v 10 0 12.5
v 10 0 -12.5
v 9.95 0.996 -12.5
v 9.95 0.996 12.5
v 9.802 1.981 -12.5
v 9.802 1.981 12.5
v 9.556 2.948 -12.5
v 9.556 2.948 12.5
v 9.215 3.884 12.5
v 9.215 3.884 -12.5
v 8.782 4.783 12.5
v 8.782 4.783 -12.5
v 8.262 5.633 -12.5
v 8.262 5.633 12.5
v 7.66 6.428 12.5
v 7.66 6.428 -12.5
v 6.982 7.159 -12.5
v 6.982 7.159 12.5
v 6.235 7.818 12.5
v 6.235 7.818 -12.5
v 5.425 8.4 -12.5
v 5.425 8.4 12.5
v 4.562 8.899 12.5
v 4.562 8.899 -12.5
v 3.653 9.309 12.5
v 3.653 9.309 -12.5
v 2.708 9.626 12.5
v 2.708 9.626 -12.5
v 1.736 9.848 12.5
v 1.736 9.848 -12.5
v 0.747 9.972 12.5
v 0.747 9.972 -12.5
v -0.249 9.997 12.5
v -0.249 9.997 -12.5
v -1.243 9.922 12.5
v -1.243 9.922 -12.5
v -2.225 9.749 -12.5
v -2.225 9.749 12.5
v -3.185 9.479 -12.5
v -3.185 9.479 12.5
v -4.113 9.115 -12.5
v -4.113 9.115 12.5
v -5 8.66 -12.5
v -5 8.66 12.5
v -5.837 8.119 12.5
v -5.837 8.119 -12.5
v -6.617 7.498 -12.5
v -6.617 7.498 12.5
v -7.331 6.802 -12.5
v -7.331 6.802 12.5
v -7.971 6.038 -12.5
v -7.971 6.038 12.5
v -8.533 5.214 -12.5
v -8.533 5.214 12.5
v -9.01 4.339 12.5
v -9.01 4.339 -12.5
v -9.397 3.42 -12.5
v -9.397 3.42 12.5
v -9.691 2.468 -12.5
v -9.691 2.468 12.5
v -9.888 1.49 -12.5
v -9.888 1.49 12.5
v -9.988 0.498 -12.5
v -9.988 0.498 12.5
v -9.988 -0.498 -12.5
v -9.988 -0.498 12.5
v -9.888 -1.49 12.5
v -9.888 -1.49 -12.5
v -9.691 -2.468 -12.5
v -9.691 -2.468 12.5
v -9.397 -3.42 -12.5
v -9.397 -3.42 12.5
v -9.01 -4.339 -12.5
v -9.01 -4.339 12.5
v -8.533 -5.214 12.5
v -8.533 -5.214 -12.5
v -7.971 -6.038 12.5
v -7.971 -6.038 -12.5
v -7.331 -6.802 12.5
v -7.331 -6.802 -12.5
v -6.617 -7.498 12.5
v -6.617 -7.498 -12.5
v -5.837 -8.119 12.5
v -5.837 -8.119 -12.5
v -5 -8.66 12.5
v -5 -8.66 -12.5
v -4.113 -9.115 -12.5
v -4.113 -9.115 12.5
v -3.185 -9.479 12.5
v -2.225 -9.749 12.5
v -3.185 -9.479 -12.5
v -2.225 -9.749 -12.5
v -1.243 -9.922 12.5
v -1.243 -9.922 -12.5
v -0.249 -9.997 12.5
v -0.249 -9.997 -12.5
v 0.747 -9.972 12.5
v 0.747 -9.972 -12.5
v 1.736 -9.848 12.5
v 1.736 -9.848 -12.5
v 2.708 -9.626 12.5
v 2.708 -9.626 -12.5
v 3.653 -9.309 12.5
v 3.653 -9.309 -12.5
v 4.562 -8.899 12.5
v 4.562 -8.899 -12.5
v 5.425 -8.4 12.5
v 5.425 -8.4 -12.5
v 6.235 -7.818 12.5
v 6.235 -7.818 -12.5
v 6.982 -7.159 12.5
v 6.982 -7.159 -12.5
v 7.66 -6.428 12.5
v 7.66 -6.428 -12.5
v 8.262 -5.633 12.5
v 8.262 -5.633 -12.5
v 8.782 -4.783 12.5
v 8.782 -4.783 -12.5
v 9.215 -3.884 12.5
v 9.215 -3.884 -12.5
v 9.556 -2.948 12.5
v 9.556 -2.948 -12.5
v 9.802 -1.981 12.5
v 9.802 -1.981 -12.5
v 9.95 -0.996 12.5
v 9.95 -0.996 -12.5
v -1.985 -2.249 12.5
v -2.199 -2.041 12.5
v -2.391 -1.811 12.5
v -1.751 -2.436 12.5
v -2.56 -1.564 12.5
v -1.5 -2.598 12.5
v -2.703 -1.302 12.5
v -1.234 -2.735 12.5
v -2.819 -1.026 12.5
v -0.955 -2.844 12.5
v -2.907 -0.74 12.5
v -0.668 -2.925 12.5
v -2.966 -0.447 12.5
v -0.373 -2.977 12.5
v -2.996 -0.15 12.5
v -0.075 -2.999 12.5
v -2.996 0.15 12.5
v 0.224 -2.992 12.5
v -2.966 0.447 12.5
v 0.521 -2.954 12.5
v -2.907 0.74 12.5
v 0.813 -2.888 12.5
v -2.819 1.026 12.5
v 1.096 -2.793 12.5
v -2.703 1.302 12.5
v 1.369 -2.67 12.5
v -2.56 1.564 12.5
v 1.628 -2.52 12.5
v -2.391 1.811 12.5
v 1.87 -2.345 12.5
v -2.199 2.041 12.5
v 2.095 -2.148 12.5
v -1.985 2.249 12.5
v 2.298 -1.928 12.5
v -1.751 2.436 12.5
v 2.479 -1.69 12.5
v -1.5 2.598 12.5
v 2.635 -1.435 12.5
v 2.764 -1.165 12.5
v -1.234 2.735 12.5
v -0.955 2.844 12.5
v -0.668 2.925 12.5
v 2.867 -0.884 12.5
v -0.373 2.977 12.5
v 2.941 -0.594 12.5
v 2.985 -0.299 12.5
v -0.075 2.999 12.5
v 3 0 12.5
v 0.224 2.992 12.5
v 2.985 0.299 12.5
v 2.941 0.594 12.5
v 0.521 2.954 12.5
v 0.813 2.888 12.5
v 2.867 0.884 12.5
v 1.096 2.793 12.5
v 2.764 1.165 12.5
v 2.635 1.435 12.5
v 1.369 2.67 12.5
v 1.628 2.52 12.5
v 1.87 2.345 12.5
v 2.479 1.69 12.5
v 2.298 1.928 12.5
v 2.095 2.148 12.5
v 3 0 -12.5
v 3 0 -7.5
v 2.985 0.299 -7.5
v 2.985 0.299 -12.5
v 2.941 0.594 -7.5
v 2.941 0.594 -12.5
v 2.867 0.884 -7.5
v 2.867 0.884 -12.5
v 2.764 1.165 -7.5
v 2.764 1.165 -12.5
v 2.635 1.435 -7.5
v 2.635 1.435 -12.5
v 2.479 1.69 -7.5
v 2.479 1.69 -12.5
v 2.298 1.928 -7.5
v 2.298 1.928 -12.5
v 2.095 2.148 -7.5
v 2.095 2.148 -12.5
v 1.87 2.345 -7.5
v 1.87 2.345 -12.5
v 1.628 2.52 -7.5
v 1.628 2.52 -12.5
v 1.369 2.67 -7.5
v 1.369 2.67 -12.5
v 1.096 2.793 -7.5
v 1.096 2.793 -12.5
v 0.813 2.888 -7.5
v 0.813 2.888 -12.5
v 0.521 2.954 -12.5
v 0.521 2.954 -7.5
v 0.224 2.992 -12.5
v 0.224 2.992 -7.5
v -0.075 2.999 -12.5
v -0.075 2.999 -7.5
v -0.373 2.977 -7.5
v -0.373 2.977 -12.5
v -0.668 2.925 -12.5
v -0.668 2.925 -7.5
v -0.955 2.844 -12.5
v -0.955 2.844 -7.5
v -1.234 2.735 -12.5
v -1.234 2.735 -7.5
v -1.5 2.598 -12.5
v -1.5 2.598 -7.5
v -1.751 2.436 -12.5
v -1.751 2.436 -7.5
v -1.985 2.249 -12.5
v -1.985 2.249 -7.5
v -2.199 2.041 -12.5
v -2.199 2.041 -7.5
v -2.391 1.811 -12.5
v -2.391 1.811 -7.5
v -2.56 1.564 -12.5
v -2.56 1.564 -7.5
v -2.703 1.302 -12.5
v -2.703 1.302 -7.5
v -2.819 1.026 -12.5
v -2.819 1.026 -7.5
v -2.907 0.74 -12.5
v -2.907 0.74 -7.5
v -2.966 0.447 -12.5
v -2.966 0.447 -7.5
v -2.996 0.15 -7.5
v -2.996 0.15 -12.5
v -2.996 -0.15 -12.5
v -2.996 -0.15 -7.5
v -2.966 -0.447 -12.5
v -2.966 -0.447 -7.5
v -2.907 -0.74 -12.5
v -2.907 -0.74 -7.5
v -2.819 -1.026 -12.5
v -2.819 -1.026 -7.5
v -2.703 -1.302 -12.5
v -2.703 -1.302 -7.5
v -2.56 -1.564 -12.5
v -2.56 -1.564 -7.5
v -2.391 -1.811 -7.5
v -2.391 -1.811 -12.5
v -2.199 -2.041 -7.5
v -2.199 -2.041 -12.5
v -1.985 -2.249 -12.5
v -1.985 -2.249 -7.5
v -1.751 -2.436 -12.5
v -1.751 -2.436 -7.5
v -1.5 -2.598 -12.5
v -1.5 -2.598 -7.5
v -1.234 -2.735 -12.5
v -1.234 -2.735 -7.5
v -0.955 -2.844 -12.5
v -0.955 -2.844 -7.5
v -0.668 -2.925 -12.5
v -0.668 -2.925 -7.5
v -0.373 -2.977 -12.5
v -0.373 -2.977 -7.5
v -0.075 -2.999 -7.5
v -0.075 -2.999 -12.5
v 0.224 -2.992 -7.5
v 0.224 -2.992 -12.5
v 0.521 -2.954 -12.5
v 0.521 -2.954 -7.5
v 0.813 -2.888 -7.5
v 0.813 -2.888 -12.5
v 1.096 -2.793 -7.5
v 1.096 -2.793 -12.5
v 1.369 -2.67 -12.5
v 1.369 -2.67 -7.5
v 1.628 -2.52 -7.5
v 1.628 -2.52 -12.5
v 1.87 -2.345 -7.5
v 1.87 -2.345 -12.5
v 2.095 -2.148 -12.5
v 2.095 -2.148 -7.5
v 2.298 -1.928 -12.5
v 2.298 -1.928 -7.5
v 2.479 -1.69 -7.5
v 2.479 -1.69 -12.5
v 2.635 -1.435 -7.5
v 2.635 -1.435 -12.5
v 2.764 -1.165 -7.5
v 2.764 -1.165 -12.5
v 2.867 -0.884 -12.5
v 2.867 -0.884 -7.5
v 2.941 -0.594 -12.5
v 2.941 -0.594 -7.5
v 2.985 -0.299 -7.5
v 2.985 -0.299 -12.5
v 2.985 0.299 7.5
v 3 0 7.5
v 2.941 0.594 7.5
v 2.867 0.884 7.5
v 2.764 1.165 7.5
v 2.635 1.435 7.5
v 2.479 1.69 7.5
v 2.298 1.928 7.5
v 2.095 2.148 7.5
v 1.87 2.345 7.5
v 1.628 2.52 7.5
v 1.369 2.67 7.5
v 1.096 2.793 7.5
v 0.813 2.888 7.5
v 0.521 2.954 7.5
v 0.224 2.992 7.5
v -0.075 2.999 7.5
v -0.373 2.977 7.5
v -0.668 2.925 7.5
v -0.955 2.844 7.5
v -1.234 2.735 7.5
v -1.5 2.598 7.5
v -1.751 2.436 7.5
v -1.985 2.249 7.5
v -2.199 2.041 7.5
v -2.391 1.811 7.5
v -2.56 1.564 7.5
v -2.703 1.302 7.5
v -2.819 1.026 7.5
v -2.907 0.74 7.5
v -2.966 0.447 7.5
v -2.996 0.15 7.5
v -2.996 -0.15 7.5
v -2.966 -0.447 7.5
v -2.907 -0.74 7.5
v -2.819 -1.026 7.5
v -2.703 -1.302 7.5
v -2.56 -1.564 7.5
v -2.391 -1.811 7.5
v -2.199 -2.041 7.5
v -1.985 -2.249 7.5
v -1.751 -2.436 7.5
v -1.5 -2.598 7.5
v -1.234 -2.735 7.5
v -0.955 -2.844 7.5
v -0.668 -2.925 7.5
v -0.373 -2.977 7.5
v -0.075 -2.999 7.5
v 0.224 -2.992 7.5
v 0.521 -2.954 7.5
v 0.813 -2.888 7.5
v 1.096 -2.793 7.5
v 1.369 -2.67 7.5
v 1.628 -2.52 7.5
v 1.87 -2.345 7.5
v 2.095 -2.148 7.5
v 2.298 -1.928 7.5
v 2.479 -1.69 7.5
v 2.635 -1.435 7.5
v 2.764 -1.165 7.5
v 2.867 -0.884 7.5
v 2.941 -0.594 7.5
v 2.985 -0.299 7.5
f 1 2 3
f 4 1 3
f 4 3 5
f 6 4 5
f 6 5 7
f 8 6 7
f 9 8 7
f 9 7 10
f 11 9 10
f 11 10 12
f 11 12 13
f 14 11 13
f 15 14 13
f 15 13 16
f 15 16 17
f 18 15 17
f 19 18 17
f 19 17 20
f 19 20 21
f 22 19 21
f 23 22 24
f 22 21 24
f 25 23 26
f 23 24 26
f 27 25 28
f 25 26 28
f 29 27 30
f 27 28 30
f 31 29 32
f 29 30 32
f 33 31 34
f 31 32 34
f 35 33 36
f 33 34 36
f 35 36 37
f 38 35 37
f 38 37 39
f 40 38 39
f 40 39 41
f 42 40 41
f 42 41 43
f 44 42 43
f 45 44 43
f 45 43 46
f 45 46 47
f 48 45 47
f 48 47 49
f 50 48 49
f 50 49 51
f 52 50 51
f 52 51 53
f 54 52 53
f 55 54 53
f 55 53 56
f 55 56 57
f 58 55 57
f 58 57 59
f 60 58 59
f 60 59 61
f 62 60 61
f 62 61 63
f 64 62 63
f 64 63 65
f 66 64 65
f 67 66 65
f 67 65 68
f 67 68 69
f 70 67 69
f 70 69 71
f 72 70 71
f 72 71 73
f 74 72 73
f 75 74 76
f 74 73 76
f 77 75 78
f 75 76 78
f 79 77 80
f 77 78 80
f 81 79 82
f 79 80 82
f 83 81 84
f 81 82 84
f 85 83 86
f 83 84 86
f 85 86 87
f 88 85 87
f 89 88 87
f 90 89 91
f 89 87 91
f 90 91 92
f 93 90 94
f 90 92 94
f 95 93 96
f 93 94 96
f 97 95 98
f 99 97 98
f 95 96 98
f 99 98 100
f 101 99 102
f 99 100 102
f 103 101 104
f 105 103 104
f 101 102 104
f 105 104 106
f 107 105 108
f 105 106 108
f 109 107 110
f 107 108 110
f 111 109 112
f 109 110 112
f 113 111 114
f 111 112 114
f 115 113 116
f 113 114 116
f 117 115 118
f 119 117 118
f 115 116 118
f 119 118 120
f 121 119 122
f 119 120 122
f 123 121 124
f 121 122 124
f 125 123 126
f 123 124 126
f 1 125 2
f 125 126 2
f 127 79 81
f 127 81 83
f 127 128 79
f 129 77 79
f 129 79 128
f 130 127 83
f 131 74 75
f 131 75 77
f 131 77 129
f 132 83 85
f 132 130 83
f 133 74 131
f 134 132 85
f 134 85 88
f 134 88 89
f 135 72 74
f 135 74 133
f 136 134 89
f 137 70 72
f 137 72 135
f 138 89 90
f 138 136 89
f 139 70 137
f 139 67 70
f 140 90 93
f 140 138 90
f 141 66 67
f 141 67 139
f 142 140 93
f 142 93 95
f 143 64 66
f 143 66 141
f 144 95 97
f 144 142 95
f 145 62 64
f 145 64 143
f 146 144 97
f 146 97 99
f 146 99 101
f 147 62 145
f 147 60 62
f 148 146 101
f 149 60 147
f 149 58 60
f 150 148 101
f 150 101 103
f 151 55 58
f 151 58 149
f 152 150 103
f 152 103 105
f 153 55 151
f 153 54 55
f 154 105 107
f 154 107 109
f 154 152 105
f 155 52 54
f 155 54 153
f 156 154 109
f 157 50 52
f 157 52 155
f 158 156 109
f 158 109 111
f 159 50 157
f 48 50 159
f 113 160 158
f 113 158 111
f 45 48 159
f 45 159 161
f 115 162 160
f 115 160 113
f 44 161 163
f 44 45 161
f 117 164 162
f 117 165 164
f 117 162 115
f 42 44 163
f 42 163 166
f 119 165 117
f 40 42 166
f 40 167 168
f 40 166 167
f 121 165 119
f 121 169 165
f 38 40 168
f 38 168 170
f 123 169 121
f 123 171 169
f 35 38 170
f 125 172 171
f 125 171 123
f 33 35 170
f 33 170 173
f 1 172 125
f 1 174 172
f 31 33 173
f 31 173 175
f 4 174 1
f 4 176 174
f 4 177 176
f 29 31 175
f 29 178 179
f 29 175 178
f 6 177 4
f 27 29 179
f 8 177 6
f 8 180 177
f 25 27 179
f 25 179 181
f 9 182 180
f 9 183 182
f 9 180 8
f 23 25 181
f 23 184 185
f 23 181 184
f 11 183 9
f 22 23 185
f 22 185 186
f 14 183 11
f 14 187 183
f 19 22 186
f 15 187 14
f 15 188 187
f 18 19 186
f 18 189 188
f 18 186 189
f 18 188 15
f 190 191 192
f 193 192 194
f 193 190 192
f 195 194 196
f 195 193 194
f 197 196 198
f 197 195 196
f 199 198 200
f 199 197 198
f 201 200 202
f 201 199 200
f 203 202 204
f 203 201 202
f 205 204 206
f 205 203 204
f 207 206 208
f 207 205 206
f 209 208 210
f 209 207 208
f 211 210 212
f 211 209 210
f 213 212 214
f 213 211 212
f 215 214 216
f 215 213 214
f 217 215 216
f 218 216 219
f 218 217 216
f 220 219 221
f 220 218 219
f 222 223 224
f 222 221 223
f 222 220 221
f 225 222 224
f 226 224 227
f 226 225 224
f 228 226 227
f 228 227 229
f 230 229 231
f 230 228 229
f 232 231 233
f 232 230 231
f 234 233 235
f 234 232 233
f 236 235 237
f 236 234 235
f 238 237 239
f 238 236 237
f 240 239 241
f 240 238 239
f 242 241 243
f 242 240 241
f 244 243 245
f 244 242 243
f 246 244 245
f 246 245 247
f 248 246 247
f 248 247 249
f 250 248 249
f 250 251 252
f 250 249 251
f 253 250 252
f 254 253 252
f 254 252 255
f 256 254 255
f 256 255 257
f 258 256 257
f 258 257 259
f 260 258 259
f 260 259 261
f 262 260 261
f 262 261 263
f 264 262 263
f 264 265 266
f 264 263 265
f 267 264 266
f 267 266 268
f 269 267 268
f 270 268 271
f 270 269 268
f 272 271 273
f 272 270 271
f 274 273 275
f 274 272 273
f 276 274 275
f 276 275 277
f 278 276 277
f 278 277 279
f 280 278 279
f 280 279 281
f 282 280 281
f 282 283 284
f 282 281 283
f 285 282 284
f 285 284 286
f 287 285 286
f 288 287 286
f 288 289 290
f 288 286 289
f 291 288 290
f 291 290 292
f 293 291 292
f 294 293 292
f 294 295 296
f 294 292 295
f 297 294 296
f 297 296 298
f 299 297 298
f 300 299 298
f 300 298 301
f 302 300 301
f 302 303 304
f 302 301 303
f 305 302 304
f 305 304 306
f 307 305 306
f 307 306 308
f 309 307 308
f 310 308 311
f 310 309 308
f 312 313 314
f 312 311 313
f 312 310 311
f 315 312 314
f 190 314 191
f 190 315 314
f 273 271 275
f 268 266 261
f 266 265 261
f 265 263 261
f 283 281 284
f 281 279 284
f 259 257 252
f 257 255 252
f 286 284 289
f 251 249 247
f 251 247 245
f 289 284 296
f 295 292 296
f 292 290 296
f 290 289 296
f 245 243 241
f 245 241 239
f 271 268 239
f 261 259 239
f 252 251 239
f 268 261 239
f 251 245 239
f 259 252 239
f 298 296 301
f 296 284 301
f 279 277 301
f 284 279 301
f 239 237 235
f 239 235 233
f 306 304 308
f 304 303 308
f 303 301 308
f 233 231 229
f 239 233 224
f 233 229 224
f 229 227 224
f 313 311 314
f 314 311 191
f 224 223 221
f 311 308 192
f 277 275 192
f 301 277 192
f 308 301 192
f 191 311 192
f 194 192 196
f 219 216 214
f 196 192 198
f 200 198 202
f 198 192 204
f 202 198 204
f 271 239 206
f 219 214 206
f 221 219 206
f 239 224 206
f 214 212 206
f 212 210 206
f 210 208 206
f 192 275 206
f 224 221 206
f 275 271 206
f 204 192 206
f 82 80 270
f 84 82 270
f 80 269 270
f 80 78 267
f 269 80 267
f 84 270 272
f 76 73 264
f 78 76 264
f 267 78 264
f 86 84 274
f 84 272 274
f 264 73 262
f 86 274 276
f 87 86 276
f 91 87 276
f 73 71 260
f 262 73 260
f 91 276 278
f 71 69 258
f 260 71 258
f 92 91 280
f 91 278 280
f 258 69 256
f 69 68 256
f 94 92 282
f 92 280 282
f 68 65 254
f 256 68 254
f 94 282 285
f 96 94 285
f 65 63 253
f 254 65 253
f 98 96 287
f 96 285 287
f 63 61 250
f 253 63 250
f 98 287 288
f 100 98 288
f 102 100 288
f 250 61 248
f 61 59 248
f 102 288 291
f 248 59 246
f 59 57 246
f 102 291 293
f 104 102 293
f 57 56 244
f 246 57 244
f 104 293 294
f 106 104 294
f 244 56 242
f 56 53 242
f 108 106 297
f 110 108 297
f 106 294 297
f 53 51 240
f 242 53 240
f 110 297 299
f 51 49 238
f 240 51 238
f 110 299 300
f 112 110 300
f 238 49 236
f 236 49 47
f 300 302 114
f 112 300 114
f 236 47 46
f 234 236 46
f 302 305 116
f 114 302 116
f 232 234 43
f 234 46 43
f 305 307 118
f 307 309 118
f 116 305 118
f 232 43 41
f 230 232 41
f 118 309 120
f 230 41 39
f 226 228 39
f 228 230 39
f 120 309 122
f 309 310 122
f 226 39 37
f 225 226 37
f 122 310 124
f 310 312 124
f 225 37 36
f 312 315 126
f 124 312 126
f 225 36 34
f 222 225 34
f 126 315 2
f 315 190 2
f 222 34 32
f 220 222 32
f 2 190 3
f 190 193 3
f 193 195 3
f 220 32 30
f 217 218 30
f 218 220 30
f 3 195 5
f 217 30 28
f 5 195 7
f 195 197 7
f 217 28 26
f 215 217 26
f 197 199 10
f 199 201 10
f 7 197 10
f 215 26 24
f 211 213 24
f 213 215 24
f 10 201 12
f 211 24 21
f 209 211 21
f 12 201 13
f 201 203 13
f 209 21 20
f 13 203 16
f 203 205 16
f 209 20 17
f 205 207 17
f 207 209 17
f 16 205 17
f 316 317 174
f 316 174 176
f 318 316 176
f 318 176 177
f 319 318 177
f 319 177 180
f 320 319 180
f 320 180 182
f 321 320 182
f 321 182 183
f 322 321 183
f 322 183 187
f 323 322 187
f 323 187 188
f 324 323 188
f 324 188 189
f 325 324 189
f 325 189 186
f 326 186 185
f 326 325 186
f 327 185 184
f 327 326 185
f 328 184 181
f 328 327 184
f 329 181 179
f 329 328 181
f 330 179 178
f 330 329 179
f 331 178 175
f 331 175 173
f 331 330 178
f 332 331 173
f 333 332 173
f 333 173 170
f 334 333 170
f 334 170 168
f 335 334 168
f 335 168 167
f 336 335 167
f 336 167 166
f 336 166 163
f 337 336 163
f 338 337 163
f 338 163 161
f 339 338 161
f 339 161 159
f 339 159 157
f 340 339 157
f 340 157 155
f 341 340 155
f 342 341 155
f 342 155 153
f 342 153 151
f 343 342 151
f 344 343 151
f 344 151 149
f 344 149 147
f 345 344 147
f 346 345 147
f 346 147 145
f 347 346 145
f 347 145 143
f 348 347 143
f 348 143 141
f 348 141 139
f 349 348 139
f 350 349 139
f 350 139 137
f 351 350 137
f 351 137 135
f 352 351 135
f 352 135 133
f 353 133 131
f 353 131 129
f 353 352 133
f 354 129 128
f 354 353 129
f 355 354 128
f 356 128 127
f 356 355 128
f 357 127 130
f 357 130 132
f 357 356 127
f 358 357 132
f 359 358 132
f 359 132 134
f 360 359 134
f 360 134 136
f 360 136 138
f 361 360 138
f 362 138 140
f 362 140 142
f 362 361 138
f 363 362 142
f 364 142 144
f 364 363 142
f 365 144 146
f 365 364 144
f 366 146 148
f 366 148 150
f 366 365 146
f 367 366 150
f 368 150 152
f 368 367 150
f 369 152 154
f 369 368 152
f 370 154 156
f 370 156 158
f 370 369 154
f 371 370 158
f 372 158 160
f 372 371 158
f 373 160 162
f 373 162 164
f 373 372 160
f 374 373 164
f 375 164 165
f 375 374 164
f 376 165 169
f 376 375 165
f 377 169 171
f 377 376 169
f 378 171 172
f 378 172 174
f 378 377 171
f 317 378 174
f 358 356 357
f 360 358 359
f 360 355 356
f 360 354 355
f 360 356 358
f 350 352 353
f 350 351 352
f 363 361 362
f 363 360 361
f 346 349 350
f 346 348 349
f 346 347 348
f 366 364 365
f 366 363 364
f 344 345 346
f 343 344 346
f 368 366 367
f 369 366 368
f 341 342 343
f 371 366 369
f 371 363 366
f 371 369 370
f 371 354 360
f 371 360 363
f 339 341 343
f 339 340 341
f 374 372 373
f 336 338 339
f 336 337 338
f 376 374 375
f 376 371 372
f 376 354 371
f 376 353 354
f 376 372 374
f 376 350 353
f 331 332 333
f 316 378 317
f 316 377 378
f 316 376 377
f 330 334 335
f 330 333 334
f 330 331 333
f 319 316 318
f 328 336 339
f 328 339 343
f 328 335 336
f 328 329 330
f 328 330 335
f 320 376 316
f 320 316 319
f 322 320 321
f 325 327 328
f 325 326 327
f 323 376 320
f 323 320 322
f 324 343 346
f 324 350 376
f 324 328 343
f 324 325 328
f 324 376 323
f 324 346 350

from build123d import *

# Parameters (mm, degrees)
BOSS_EXTRUDE1_DEPTH      = 7.5
BOSS_EXTRUDE1_DEPTH_BACK = 7.5
SKETCH1_R                = 10
BOSS_EXTRUDE2_DEPTH      = 12.5
BOSS_EXTRUDE2_DEPTH_BACK = 12.5
SKETCH1_2_R              = 10
SKETCH1_2_R_2            = 3


with BuildPart() as part:
    # Sketch1 → Boss-Extrude1 (new, two sides: drawn at the far end of the back side and taken through both)
    with BuildSketch(Plane.XY.offset(-BOSS_EXTRUDE1_DEPTH_BACK)):
        Circle(SKETCH1_R)
    extrude(amount=BOSS_EXTRUDE1_DEPTH + BOSS_EXTRUDE1_DEPTH_BACK)

    # Sketch1<2> → Boss-Extrude2 (add, two sides: drawn at the far end of the back side and taken through both)
    with BuildSketch(Plane.XY.offset(-BOSS_EXTRUDE2_DEPTH_BACK)):
        Circle(SKETCH1_2_R)
        Circle(SKETCH1_2_R_2, mode=Mode.SUBTRACT)
    extrude(amount=BOSS_EXTRUDE2_DEPTH + BOSS_EXTRUDE2_DEPTH_BACK)


solid = part.part
